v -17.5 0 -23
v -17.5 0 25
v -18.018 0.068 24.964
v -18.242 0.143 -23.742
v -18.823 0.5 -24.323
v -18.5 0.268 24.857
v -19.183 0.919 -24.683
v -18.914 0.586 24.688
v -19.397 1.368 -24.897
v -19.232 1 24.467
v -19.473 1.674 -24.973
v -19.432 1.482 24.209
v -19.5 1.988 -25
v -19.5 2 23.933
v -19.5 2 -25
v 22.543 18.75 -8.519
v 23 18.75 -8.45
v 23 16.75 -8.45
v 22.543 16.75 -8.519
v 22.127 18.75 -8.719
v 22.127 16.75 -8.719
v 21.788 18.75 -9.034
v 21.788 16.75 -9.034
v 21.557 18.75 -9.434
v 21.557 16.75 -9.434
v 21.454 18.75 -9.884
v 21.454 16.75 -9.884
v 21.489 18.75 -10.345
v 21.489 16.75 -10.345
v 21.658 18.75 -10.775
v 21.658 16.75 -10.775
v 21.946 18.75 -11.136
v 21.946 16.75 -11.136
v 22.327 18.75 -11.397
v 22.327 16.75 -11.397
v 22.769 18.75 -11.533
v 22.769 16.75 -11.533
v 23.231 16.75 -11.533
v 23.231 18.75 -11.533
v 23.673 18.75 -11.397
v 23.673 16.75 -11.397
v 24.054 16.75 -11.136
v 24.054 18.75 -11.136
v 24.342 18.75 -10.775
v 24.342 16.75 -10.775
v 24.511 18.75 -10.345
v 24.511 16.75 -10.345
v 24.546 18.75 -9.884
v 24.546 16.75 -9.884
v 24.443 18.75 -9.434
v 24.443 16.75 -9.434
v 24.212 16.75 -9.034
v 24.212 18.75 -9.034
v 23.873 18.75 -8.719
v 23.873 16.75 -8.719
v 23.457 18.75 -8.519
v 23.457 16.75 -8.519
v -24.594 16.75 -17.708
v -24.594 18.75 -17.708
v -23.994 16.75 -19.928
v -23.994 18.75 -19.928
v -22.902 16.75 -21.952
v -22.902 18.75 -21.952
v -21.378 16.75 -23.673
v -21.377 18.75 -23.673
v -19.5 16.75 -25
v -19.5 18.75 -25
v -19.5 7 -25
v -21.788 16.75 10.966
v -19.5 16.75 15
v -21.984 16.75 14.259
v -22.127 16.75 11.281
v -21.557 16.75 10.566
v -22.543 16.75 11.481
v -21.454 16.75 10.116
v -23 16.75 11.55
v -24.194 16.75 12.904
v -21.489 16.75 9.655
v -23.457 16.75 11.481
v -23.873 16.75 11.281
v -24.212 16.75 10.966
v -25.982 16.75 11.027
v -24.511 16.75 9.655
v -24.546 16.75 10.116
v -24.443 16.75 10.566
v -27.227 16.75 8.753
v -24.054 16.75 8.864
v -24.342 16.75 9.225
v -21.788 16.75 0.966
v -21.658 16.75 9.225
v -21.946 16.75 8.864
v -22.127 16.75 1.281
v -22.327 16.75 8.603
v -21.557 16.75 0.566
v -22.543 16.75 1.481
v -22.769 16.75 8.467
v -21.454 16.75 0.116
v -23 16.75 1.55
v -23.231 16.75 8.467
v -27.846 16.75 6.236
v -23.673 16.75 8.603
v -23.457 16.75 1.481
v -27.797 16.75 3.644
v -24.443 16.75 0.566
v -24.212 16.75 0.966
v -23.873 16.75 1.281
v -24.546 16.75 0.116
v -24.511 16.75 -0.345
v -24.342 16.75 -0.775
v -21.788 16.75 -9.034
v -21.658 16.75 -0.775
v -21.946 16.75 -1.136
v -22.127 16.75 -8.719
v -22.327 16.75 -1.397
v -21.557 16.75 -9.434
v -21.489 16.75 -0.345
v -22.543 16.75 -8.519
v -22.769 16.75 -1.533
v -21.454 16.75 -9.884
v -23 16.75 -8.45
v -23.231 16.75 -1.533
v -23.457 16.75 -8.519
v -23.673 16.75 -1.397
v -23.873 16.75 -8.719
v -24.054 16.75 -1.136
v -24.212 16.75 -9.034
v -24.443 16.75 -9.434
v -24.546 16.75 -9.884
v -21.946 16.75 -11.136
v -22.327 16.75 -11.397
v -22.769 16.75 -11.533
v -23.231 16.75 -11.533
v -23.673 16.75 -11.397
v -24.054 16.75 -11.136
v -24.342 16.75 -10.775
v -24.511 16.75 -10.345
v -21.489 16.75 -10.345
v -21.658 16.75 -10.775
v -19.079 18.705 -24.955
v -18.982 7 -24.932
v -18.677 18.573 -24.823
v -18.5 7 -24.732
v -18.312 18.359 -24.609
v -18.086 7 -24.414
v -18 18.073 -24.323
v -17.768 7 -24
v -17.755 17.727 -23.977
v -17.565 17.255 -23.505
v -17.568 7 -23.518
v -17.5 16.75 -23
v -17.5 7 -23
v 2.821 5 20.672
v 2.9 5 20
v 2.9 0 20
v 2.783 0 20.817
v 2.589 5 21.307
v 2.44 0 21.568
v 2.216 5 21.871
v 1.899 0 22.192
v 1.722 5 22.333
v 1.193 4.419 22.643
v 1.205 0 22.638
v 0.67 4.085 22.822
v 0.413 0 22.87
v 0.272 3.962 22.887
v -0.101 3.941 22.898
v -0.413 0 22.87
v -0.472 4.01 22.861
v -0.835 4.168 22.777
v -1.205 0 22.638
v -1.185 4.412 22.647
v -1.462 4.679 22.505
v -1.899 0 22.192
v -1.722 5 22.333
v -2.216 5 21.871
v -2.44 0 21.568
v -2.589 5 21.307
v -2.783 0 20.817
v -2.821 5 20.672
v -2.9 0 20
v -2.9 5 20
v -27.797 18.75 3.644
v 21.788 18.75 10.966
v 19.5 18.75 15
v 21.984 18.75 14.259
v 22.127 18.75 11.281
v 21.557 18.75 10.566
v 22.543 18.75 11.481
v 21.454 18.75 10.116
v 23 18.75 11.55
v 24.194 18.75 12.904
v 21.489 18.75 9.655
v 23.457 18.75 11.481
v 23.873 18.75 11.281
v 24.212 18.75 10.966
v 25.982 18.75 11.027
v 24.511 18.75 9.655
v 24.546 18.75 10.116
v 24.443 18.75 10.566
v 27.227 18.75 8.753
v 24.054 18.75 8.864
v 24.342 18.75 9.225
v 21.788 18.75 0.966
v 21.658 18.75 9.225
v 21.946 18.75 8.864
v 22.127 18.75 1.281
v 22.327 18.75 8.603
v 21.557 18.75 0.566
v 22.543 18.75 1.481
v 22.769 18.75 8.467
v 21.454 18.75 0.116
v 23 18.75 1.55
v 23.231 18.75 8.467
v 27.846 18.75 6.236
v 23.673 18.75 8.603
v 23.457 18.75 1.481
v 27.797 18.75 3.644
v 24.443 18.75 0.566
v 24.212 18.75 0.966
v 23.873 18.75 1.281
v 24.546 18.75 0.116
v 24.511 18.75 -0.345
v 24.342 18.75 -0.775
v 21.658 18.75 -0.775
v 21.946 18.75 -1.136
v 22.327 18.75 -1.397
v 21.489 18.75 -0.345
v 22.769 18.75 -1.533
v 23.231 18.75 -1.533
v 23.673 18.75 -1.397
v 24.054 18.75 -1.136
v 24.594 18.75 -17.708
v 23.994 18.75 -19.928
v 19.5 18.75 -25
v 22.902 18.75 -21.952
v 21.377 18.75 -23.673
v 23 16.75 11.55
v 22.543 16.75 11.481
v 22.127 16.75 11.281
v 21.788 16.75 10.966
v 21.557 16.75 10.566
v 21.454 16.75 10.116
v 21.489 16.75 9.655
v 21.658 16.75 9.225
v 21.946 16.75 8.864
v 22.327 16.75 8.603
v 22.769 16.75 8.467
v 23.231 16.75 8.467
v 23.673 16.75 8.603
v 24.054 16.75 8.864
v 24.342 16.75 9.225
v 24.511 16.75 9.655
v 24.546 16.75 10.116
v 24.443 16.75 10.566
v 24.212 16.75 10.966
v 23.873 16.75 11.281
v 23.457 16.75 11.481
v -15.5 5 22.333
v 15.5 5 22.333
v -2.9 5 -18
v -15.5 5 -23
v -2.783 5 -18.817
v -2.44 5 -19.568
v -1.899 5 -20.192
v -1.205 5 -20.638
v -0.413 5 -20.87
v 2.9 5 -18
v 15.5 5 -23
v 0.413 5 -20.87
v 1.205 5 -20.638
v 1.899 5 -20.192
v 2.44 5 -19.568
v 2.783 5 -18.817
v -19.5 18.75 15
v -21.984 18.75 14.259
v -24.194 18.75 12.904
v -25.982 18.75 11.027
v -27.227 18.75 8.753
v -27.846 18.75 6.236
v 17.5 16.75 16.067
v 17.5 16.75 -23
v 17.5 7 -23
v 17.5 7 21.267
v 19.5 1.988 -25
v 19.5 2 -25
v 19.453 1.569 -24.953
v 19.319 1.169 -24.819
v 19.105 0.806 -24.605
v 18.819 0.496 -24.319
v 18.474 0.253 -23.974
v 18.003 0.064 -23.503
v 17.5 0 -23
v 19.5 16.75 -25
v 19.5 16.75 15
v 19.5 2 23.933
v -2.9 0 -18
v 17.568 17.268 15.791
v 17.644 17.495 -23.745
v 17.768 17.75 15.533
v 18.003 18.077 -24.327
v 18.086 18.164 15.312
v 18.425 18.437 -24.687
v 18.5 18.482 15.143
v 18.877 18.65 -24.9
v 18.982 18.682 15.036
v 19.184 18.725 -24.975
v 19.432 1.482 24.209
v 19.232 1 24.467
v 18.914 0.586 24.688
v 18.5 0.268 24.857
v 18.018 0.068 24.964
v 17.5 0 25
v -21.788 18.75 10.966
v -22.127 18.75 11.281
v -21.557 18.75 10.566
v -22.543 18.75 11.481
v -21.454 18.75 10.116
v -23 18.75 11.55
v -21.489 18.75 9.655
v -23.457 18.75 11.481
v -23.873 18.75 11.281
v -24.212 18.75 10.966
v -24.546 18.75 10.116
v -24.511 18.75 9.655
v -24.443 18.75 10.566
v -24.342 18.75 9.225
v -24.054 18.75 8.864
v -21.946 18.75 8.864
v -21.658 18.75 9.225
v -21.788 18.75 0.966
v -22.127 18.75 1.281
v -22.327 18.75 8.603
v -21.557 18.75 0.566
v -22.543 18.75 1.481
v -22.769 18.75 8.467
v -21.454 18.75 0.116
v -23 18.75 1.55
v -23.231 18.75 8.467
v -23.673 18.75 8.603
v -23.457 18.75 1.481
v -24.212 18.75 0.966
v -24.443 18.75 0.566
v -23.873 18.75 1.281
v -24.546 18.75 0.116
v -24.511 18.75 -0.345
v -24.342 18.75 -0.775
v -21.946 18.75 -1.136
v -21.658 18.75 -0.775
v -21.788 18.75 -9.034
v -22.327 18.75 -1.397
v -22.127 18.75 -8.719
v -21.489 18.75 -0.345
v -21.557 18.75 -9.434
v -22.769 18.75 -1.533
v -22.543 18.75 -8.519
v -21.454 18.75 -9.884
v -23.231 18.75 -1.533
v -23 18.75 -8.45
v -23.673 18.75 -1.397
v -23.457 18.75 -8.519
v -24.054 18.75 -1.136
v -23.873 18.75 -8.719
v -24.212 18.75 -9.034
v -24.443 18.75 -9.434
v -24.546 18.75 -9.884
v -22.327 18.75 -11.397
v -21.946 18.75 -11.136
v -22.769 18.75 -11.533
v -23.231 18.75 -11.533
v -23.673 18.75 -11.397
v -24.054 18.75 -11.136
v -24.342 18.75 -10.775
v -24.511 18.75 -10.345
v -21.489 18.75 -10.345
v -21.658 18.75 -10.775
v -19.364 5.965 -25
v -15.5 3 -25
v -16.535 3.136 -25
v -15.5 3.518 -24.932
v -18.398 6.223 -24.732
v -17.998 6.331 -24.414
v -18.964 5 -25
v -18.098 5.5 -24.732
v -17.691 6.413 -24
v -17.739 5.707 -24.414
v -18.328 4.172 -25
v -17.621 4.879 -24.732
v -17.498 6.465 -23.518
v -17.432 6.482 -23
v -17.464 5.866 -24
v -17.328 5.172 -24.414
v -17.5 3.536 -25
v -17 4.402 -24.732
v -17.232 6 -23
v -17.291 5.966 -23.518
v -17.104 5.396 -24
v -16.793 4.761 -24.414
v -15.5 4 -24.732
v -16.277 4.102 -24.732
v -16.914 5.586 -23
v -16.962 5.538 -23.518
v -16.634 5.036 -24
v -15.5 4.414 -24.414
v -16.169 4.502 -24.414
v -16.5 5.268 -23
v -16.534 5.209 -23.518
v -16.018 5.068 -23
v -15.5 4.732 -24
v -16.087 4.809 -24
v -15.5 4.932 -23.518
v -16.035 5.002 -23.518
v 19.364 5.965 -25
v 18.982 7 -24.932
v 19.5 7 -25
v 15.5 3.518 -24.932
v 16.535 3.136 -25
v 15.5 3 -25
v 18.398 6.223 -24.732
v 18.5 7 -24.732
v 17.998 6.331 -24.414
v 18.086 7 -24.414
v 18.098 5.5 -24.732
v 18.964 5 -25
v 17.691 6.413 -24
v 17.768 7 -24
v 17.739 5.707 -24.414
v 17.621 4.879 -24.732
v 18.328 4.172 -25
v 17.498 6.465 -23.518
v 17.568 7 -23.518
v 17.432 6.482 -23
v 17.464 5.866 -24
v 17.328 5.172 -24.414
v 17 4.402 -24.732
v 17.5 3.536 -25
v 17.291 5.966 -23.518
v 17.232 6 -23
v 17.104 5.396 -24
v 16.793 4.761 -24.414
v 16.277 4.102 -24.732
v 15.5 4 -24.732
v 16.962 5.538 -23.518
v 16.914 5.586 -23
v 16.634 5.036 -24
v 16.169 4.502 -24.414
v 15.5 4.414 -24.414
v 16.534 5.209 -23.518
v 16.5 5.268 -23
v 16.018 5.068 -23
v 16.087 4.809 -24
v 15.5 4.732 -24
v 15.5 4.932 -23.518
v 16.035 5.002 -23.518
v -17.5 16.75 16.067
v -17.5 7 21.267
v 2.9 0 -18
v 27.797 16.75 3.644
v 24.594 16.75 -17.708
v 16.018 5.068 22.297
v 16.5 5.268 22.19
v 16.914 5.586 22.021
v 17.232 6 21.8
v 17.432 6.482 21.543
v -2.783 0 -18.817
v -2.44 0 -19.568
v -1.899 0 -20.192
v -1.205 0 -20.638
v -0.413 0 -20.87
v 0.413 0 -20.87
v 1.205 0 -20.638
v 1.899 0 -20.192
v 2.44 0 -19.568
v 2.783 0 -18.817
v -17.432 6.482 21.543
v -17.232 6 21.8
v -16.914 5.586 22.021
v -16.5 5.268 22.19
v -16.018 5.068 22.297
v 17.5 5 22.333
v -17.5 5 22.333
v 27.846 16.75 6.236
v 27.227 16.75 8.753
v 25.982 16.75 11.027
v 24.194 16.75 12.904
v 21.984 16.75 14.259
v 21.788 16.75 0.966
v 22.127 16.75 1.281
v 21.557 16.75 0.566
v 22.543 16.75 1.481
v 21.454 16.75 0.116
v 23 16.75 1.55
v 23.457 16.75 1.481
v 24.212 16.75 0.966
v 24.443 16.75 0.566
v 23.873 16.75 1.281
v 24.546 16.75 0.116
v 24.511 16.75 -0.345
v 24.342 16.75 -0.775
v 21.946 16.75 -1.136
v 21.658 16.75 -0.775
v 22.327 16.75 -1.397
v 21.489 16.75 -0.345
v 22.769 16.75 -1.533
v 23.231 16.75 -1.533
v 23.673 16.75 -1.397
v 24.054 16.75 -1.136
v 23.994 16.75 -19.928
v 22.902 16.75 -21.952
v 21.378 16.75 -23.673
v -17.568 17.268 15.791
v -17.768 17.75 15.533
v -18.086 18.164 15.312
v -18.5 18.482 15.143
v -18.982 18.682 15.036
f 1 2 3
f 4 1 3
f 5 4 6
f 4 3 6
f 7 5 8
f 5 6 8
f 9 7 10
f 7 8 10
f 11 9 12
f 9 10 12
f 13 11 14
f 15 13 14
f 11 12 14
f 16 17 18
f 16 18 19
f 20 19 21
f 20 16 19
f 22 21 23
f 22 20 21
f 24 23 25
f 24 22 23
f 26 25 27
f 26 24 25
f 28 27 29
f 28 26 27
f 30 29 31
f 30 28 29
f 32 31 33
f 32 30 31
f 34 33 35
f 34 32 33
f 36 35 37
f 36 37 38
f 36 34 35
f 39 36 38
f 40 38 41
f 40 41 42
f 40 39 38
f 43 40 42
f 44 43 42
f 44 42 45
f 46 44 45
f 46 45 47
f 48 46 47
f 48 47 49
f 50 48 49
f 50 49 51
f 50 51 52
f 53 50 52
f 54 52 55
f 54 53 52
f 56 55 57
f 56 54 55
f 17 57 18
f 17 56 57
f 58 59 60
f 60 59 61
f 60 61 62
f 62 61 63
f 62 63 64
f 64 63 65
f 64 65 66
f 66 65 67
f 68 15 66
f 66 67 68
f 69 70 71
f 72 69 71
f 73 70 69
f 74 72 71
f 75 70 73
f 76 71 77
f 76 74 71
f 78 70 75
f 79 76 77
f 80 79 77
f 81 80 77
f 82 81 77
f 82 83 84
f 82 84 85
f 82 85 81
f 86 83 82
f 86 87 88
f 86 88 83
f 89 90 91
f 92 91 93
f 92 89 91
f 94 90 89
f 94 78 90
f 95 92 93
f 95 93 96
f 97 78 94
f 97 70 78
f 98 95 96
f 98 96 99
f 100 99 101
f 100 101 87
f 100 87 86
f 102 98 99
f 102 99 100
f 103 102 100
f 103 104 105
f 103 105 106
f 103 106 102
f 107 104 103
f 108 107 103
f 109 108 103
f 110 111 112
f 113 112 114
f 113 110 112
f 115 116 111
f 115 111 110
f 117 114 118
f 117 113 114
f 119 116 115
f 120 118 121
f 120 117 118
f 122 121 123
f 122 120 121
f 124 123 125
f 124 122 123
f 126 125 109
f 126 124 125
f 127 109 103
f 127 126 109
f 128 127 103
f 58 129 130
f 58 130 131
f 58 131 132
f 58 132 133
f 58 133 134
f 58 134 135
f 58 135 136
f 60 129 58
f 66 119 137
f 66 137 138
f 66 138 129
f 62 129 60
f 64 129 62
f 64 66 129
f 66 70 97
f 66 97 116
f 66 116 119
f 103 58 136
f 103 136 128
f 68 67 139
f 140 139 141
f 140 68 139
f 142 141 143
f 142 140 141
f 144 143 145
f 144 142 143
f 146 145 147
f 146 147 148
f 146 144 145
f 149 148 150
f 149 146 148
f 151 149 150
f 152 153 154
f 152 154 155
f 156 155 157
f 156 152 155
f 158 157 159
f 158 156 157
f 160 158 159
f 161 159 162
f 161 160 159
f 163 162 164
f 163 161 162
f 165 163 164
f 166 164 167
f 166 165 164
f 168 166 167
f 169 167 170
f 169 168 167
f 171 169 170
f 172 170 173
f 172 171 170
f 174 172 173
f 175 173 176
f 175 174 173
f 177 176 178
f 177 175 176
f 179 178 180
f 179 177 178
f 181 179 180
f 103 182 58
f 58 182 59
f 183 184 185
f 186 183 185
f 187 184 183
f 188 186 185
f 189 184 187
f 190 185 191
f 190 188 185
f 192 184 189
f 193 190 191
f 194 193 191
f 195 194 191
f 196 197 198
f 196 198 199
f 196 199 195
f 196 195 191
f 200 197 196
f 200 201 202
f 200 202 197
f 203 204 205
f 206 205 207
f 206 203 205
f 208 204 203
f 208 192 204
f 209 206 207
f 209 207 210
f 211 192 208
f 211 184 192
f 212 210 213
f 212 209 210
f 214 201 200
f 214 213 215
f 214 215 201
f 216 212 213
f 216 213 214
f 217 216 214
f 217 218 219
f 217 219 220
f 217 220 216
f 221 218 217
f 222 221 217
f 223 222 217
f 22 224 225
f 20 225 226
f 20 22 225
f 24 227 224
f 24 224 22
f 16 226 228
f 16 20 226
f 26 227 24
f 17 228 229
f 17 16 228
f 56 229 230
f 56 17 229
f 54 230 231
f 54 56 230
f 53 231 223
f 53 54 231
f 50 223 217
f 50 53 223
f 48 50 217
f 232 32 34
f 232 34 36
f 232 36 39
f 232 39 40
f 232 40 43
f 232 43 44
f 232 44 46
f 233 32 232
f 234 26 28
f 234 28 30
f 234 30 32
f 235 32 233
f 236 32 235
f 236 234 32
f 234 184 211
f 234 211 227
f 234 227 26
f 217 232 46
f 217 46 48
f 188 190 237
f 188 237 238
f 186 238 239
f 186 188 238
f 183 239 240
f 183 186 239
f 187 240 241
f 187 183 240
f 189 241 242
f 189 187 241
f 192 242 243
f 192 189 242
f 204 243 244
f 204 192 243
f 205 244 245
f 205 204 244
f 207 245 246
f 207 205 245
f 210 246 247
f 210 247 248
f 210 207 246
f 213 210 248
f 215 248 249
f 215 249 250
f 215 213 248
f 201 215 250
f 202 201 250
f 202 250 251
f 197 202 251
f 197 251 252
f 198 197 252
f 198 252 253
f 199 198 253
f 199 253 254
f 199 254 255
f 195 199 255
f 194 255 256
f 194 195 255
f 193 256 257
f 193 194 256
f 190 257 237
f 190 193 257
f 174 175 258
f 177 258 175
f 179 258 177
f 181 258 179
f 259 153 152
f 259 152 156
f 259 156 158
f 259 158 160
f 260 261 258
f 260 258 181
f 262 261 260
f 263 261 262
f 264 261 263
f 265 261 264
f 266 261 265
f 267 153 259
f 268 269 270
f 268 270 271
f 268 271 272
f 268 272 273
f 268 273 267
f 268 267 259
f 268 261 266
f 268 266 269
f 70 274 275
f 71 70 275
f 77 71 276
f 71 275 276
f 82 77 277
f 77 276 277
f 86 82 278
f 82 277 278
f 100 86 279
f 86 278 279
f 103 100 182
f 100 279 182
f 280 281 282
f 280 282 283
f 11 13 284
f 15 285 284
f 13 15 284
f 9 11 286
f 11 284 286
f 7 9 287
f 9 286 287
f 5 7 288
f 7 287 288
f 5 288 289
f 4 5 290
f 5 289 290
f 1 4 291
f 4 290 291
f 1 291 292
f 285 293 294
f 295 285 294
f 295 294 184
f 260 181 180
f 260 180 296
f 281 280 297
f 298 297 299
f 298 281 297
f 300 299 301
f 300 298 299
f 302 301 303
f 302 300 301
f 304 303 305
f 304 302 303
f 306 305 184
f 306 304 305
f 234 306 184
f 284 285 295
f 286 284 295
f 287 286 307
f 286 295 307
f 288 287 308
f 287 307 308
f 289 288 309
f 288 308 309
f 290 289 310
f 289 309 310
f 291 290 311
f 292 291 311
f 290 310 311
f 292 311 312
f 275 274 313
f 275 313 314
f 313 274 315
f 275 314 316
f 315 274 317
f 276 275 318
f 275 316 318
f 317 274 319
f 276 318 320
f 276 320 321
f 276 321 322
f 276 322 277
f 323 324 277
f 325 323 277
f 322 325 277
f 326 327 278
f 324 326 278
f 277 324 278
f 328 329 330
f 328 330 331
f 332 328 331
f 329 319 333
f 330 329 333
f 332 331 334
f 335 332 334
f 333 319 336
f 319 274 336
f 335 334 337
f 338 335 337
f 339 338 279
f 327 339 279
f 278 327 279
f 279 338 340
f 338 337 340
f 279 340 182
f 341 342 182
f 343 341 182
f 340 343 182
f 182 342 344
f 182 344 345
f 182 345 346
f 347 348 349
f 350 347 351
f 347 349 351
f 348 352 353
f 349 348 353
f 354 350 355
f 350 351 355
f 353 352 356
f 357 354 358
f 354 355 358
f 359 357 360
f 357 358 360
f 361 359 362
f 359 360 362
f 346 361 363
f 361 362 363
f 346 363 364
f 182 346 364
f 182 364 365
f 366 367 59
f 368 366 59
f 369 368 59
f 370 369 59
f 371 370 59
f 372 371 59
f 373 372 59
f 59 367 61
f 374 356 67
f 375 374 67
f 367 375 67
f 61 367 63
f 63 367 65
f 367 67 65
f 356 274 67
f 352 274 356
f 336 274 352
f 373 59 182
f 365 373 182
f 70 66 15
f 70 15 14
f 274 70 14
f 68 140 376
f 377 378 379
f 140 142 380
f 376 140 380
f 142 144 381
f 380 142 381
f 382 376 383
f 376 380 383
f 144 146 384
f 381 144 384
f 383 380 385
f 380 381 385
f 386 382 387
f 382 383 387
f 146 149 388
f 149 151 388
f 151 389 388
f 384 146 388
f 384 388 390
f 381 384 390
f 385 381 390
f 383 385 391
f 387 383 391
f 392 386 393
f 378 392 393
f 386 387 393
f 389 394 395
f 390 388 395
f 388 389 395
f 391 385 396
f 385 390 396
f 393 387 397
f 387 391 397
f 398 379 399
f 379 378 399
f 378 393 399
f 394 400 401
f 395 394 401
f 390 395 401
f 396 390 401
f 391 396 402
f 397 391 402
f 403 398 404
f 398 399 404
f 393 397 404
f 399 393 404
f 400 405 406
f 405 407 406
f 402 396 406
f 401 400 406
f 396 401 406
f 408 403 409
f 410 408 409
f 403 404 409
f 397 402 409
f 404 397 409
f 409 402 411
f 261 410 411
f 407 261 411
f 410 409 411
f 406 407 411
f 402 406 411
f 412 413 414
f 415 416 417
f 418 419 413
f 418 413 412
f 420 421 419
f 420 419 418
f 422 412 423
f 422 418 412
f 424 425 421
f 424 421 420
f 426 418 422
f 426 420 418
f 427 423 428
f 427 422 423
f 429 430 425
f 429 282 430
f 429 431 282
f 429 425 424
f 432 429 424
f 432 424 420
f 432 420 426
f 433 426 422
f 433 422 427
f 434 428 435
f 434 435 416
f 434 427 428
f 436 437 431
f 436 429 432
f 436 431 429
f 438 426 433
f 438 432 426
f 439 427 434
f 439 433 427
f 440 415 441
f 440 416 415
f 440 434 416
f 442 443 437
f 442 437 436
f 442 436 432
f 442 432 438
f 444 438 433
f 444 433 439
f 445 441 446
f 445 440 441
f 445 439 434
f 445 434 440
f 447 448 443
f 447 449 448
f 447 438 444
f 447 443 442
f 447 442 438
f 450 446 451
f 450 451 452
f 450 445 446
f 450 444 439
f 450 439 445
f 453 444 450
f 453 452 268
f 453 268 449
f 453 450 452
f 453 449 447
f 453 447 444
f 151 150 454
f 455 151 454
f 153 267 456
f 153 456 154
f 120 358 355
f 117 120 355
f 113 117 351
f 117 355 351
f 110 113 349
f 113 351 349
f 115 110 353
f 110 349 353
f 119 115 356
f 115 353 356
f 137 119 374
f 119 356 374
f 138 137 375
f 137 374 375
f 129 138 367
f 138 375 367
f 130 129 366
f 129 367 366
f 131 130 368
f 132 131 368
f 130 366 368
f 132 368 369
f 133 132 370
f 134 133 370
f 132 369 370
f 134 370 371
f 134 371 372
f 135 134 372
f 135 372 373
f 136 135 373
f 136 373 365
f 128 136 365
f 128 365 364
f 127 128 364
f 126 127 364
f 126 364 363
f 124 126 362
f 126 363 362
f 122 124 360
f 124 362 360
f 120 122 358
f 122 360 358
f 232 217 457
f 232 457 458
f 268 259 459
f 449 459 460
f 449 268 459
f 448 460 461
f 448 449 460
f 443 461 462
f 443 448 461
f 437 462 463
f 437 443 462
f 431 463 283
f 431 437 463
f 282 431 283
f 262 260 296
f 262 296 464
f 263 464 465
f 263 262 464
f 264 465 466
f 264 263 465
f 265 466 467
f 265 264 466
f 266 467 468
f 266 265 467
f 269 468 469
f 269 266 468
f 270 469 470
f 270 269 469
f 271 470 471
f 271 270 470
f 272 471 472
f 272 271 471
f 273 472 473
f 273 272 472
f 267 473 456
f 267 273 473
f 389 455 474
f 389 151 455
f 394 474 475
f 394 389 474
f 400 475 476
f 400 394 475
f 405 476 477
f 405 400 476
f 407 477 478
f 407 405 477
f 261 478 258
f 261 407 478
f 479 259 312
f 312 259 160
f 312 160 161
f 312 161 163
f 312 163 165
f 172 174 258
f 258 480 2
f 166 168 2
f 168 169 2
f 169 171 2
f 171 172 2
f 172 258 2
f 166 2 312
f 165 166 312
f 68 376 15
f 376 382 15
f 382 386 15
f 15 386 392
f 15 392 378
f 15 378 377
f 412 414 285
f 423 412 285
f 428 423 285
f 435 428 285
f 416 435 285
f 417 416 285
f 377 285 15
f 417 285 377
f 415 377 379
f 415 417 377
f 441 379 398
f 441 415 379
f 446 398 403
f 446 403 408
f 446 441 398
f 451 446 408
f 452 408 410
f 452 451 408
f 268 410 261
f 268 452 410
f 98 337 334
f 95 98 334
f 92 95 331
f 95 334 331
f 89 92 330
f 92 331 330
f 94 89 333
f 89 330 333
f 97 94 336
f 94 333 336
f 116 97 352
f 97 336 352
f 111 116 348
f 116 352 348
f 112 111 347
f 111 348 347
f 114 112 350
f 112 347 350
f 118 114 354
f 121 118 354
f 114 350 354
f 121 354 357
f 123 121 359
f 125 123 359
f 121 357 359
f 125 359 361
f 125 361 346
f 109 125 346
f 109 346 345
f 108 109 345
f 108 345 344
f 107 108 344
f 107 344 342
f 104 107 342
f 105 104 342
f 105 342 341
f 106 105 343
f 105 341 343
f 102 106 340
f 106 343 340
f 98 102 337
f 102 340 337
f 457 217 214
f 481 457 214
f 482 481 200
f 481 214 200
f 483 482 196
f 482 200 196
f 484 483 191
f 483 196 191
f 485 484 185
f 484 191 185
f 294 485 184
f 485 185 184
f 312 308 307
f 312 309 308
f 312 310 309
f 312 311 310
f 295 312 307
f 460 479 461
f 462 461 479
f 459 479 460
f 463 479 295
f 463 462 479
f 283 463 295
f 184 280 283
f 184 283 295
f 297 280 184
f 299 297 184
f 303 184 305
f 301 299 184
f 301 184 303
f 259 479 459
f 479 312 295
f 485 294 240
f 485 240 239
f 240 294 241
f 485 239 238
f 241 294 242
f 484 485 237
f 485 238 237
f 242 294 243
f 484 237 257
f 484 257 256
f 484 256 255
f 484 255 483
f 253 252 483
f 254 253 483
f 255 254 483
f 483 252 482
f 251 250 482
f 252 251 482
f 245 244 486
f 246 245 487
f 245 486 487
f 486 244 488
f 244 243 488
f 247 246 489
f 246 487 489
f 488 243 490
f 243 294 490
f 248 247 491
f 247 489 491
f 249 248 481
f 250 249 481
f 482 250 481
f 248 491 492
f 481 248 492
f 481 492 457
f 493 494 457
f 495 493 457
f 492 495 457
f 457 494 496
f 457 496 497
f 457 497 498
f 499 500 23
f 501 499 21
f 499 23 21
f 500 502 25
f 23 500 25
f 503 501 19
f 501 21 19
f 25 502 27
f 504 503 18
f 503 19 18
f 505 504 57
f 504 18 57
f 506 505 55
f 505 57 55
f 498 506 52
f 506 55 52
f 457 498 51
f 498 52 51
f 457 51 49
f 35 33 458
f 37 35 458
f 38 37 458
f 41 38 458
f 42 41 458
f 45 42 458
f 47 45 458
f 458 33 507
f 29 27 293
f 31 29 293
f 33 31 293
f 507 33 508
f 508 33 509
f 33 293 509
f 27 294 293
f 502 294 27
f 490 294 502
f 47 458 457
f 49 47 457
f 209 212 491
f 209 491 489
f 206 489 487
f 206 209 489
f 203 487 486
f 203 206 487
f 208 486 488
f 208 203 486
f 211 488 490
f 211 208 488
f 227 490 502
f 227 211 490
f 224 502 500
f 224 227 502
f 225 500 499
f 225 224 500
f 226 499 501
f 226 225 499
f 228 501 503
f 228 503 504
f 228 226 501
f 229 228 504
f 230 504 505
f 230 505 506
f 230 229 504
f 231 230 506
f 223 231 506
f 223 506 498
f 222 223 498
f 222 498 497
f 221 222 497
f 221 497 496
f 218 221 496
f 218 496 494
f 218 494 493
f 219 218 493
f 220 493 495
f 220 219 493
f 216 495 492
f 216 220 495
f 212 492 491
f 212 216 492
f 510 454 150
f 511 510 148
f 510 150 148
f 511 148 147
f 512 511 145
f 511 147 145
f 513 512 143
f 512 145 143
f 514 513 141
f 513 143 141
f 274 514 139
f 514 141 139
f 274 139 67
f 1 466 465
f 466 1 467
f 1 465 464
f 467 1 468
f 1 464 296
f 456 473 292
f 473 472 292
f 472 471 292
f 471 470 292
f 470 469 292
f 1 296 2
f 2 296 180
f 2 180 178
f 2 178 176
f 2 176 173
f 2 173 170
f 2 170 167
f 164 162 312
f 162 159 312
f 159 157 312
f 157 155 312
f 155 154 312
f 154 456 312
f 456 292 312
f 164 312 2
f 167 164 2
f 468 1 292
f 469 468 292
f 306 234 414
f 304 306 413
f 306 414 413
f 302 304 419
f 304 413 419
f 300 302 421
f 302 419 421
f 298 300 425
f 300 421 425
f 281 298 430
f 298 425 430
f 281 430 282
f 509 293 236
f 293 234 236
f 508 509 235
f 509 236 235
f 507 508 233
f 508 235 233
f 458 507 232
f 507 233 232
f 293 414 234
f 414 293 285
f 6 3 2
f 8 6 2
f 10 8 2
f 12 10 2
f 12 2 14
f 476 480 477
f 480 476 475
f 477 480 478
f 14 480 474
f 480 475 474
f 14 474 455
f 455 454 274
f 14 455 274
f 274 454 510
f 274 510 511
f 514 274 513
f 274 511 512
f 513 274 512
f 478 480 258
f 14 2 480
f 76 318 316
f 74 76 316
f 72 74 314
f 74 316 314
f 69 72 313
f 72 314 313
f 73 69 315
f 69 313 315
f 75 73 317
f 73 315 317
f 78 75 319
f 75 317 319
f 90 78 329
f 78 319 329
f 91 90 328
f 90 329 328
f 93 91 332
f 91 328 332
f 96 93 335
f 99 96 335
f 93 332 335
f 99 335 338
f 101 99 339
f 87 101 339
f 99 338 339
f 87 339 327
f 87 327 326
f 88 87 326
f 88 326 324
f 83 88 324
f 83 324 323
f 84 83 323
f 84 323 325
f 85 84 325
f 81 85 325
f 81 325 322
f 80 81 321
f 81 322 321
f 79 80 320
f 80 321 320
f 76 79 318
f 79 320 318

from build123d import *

# Parameters (mm, degrees)
SKETCH2_W           = 35
SKETCH2_H           = 50
BOSS_EXTRUDE1_DEPTH = 5
BOSS_EXTRUDE2_DEPTH = 2
SKETCH4_R           = 1.55
BOSS_EXTRUDE3_DEPTH = 2
FILLET1_R           = 2
FILLET2_R           = 10
CUT_EXTRUDE1_DEPTH  = 40.91088123
CUT_EXTRUDE2_DEPTH  = 56.121529602


# Some blends are built 0.0001 mm under size
with BuildPart() as part:
    # Sketch2 → Boss-Extrude1 (new body)
    with BuildSketch(Plane(origin=(0, 0, 0), x_dir=(1, 0, 0), z_dir=(0, 1, 0))):
        Rectangle(SKETCH2_W, SKETCH2_H)
    extrude(amount=BOSS_EXTRUDE1_DEPTH)

    # Sketch3 → Boss-Extrude2 (add)
    with BuildSketch(Plane(origin=(17.5, 0, 0), x_dir=(0, 0, -1), z_dir=(1, 0, 0))):
        Polygon((-25, 0), (-15, 18.75), (25, 18.75), (25, 0), align=None)
    boss_extrude2 = extrude(amount=BOSS_EXTRUDE2_DEPTH)

    # Mirror1: Boss-Extrude2 across plane
    add(boss_extrude2.mirror(Plane(origin=(0, 0, 0), x_dir=(0, 0, 1), z_dir=(1, 0, 0))))

    # Sketch4 → Boss-Extrude3 (add)
    with BuildSketch(Plane(origin=(0, 18.75, 0), x_dir=(1, 0, 0), z_dir=(0, 1, 0))):
        Polygon((-19.5, -15), (-29.5, -15), (-23.5, 25), (-19.5, 25), align=None)
        with Locations(Location((-23, -10, 0), (0, 0, 270))):
            Circle(SKETCH4_R, mode=Mode.SUBTRACT)
        with Locations(Location((-23, 0, 0), (0, 0, 270))):
            Circle(SKETCH4_R, mode=Mode.SUBTRACT)
        with Locations(Location((-23, 10, 0), (0, 0, 270))):
            Circle(SKETCH4_R, mode=Mode.SUBTRACT)
    boss_extrude3 = extrude(amount=-BOSS_EXTRUDE3_DEPTH)

    # Fillet1
    fillet1_edges = [part.edges().sort_by_distance(p)[0] for p in [
        (-17.5, 5, -1.333333333),
        (17.5, 5, -1.333333333),
        (17.5, 18.75, -5),
        (19.5, 0, 0),
        (-17.5, 11.875, -25),
        (-17.5, 18.75, -5),
        (-19.5, 0, 0),
        (17.5, 11.875, -25),
        (0, 0, -25),
        (0, 5, -25),
    ]]
    fillet(fillet1_edges, radius=FILLET1_R - 0.0001)  # a hair under: the kernel refuses the full size

    # Mirror2: Boss-Extrude3 across plane
    add(boss_extrude3.mirror(Plane(origin=(0, 0, 0), x_dir=(0, 0, 1), z_dir=(1, 0, 0))))

    # Fillet2
    # the kernel refuses this fillet: 10 mm, written as the material it takes off along each edge
    with BuildSketch(Plane(origin=(-29.5, 47.456981223, 15), x_dir=(1, 0, 0), z_dir=(0, -1, 0))) as fillet2_piece_1:
        with BuildLine():
            CenterArc((11.592726167, -9.872346396), FILLET2_R, 99.164678829, 89.366086781)
            Line((1.703362639, -11.355750925), (0, 0))
            Line((0, 0), (10, 0))
        make_face()
    extrude(amount=59.413962446, mode=Mode.SUBTRACT)
    with BuildSketch(Plane(origin=(29.5, 47.456981223, 15), x_dir=(-0.1483404529302447, 0, -0.9889363528682975), z_dir=(0, -1, 0))) as fillet2_piece_2:
        with BuildLine():
            CenterArc((11.482792489, -10), FILLET2_R, 90, 89.366086781)
            Line((1.483404529, -9.889363529), (0, 0))
            Line((0, 0), (11.482792489, 0))
        make_face()
    extrude(amount=59.413962446, mode=Mode.SUBTRACT)
    with BuildSketch(Plane(origin=(-23.5, 37.183288466, -25), x_dir=(1.0, 0, 1.2229911091485247e-12), z_dir=(0, -1, 0))) as fillet2_piece_3:
        with BuildLine():
            CenterArc((8.795602585, 8.775144156), FILLET2_R, 188.53076561, 52.813201583)
            Line((-1.093760944, 7.291739627), (0, 0))
            Line((0, 0), (4.0001, 0))
        make_face()
    extrude(amount=38.866576932, mode=Mode.SUBTRACT)
    with BuildSketch(Plane(origin=(23.5, 37.183288466, -25), x_dir=(-1.0, 0, 1.2229911091485247e-12), z_dir=(0, -1, 0))) as fillet2_piece_4:
        with BuildLine():
            CenterArc((8.795602585, -8.775144156), FILLET2_R, 118.656032807, 52.813201583)
            Line((-1.093760944, -7.291739627), (0, 0))
            Line((0, 0), (4.0001, 0))
        make_face()
    extrude(amount=38.866576932, mode=Mode.SUBTRACT)

    # Sketch5 → Cut-Extrude1 (cut, through all)
    with BuildSketch(Plane(origin=(0, 5, 0), x_dir=(1, 0, 0), z_dir=(0, 1, 0))):
        with BuildLine():
            Line((2.9, 18), (2.9, -20))
            ThreePointArc((2.9, -20), (0, -22.9), (-2.9, -20))
            Line((-2.9, -20), (-2.9, 18))
            ThreePointArc((-2.9, 18), (0, 20.9), (2.9, 18))
        make_face()
    extrude(amount=-CUT_EXTRUDE1_DEPTH, mode=Mode.SUBTRACT)

    # Sketch6 → Cut-Extrude2 (cut, through all)
    with BuildSketch(Plane.ZY.offset(17.5)):
        Polygon((25, 5), (22.333333333, 5), (25, 0), align=None)
    extrude(amount=-CUT_EXTRUDE2_DEPTH, mode=Mode.SUBTRACT)


solid = part.part
